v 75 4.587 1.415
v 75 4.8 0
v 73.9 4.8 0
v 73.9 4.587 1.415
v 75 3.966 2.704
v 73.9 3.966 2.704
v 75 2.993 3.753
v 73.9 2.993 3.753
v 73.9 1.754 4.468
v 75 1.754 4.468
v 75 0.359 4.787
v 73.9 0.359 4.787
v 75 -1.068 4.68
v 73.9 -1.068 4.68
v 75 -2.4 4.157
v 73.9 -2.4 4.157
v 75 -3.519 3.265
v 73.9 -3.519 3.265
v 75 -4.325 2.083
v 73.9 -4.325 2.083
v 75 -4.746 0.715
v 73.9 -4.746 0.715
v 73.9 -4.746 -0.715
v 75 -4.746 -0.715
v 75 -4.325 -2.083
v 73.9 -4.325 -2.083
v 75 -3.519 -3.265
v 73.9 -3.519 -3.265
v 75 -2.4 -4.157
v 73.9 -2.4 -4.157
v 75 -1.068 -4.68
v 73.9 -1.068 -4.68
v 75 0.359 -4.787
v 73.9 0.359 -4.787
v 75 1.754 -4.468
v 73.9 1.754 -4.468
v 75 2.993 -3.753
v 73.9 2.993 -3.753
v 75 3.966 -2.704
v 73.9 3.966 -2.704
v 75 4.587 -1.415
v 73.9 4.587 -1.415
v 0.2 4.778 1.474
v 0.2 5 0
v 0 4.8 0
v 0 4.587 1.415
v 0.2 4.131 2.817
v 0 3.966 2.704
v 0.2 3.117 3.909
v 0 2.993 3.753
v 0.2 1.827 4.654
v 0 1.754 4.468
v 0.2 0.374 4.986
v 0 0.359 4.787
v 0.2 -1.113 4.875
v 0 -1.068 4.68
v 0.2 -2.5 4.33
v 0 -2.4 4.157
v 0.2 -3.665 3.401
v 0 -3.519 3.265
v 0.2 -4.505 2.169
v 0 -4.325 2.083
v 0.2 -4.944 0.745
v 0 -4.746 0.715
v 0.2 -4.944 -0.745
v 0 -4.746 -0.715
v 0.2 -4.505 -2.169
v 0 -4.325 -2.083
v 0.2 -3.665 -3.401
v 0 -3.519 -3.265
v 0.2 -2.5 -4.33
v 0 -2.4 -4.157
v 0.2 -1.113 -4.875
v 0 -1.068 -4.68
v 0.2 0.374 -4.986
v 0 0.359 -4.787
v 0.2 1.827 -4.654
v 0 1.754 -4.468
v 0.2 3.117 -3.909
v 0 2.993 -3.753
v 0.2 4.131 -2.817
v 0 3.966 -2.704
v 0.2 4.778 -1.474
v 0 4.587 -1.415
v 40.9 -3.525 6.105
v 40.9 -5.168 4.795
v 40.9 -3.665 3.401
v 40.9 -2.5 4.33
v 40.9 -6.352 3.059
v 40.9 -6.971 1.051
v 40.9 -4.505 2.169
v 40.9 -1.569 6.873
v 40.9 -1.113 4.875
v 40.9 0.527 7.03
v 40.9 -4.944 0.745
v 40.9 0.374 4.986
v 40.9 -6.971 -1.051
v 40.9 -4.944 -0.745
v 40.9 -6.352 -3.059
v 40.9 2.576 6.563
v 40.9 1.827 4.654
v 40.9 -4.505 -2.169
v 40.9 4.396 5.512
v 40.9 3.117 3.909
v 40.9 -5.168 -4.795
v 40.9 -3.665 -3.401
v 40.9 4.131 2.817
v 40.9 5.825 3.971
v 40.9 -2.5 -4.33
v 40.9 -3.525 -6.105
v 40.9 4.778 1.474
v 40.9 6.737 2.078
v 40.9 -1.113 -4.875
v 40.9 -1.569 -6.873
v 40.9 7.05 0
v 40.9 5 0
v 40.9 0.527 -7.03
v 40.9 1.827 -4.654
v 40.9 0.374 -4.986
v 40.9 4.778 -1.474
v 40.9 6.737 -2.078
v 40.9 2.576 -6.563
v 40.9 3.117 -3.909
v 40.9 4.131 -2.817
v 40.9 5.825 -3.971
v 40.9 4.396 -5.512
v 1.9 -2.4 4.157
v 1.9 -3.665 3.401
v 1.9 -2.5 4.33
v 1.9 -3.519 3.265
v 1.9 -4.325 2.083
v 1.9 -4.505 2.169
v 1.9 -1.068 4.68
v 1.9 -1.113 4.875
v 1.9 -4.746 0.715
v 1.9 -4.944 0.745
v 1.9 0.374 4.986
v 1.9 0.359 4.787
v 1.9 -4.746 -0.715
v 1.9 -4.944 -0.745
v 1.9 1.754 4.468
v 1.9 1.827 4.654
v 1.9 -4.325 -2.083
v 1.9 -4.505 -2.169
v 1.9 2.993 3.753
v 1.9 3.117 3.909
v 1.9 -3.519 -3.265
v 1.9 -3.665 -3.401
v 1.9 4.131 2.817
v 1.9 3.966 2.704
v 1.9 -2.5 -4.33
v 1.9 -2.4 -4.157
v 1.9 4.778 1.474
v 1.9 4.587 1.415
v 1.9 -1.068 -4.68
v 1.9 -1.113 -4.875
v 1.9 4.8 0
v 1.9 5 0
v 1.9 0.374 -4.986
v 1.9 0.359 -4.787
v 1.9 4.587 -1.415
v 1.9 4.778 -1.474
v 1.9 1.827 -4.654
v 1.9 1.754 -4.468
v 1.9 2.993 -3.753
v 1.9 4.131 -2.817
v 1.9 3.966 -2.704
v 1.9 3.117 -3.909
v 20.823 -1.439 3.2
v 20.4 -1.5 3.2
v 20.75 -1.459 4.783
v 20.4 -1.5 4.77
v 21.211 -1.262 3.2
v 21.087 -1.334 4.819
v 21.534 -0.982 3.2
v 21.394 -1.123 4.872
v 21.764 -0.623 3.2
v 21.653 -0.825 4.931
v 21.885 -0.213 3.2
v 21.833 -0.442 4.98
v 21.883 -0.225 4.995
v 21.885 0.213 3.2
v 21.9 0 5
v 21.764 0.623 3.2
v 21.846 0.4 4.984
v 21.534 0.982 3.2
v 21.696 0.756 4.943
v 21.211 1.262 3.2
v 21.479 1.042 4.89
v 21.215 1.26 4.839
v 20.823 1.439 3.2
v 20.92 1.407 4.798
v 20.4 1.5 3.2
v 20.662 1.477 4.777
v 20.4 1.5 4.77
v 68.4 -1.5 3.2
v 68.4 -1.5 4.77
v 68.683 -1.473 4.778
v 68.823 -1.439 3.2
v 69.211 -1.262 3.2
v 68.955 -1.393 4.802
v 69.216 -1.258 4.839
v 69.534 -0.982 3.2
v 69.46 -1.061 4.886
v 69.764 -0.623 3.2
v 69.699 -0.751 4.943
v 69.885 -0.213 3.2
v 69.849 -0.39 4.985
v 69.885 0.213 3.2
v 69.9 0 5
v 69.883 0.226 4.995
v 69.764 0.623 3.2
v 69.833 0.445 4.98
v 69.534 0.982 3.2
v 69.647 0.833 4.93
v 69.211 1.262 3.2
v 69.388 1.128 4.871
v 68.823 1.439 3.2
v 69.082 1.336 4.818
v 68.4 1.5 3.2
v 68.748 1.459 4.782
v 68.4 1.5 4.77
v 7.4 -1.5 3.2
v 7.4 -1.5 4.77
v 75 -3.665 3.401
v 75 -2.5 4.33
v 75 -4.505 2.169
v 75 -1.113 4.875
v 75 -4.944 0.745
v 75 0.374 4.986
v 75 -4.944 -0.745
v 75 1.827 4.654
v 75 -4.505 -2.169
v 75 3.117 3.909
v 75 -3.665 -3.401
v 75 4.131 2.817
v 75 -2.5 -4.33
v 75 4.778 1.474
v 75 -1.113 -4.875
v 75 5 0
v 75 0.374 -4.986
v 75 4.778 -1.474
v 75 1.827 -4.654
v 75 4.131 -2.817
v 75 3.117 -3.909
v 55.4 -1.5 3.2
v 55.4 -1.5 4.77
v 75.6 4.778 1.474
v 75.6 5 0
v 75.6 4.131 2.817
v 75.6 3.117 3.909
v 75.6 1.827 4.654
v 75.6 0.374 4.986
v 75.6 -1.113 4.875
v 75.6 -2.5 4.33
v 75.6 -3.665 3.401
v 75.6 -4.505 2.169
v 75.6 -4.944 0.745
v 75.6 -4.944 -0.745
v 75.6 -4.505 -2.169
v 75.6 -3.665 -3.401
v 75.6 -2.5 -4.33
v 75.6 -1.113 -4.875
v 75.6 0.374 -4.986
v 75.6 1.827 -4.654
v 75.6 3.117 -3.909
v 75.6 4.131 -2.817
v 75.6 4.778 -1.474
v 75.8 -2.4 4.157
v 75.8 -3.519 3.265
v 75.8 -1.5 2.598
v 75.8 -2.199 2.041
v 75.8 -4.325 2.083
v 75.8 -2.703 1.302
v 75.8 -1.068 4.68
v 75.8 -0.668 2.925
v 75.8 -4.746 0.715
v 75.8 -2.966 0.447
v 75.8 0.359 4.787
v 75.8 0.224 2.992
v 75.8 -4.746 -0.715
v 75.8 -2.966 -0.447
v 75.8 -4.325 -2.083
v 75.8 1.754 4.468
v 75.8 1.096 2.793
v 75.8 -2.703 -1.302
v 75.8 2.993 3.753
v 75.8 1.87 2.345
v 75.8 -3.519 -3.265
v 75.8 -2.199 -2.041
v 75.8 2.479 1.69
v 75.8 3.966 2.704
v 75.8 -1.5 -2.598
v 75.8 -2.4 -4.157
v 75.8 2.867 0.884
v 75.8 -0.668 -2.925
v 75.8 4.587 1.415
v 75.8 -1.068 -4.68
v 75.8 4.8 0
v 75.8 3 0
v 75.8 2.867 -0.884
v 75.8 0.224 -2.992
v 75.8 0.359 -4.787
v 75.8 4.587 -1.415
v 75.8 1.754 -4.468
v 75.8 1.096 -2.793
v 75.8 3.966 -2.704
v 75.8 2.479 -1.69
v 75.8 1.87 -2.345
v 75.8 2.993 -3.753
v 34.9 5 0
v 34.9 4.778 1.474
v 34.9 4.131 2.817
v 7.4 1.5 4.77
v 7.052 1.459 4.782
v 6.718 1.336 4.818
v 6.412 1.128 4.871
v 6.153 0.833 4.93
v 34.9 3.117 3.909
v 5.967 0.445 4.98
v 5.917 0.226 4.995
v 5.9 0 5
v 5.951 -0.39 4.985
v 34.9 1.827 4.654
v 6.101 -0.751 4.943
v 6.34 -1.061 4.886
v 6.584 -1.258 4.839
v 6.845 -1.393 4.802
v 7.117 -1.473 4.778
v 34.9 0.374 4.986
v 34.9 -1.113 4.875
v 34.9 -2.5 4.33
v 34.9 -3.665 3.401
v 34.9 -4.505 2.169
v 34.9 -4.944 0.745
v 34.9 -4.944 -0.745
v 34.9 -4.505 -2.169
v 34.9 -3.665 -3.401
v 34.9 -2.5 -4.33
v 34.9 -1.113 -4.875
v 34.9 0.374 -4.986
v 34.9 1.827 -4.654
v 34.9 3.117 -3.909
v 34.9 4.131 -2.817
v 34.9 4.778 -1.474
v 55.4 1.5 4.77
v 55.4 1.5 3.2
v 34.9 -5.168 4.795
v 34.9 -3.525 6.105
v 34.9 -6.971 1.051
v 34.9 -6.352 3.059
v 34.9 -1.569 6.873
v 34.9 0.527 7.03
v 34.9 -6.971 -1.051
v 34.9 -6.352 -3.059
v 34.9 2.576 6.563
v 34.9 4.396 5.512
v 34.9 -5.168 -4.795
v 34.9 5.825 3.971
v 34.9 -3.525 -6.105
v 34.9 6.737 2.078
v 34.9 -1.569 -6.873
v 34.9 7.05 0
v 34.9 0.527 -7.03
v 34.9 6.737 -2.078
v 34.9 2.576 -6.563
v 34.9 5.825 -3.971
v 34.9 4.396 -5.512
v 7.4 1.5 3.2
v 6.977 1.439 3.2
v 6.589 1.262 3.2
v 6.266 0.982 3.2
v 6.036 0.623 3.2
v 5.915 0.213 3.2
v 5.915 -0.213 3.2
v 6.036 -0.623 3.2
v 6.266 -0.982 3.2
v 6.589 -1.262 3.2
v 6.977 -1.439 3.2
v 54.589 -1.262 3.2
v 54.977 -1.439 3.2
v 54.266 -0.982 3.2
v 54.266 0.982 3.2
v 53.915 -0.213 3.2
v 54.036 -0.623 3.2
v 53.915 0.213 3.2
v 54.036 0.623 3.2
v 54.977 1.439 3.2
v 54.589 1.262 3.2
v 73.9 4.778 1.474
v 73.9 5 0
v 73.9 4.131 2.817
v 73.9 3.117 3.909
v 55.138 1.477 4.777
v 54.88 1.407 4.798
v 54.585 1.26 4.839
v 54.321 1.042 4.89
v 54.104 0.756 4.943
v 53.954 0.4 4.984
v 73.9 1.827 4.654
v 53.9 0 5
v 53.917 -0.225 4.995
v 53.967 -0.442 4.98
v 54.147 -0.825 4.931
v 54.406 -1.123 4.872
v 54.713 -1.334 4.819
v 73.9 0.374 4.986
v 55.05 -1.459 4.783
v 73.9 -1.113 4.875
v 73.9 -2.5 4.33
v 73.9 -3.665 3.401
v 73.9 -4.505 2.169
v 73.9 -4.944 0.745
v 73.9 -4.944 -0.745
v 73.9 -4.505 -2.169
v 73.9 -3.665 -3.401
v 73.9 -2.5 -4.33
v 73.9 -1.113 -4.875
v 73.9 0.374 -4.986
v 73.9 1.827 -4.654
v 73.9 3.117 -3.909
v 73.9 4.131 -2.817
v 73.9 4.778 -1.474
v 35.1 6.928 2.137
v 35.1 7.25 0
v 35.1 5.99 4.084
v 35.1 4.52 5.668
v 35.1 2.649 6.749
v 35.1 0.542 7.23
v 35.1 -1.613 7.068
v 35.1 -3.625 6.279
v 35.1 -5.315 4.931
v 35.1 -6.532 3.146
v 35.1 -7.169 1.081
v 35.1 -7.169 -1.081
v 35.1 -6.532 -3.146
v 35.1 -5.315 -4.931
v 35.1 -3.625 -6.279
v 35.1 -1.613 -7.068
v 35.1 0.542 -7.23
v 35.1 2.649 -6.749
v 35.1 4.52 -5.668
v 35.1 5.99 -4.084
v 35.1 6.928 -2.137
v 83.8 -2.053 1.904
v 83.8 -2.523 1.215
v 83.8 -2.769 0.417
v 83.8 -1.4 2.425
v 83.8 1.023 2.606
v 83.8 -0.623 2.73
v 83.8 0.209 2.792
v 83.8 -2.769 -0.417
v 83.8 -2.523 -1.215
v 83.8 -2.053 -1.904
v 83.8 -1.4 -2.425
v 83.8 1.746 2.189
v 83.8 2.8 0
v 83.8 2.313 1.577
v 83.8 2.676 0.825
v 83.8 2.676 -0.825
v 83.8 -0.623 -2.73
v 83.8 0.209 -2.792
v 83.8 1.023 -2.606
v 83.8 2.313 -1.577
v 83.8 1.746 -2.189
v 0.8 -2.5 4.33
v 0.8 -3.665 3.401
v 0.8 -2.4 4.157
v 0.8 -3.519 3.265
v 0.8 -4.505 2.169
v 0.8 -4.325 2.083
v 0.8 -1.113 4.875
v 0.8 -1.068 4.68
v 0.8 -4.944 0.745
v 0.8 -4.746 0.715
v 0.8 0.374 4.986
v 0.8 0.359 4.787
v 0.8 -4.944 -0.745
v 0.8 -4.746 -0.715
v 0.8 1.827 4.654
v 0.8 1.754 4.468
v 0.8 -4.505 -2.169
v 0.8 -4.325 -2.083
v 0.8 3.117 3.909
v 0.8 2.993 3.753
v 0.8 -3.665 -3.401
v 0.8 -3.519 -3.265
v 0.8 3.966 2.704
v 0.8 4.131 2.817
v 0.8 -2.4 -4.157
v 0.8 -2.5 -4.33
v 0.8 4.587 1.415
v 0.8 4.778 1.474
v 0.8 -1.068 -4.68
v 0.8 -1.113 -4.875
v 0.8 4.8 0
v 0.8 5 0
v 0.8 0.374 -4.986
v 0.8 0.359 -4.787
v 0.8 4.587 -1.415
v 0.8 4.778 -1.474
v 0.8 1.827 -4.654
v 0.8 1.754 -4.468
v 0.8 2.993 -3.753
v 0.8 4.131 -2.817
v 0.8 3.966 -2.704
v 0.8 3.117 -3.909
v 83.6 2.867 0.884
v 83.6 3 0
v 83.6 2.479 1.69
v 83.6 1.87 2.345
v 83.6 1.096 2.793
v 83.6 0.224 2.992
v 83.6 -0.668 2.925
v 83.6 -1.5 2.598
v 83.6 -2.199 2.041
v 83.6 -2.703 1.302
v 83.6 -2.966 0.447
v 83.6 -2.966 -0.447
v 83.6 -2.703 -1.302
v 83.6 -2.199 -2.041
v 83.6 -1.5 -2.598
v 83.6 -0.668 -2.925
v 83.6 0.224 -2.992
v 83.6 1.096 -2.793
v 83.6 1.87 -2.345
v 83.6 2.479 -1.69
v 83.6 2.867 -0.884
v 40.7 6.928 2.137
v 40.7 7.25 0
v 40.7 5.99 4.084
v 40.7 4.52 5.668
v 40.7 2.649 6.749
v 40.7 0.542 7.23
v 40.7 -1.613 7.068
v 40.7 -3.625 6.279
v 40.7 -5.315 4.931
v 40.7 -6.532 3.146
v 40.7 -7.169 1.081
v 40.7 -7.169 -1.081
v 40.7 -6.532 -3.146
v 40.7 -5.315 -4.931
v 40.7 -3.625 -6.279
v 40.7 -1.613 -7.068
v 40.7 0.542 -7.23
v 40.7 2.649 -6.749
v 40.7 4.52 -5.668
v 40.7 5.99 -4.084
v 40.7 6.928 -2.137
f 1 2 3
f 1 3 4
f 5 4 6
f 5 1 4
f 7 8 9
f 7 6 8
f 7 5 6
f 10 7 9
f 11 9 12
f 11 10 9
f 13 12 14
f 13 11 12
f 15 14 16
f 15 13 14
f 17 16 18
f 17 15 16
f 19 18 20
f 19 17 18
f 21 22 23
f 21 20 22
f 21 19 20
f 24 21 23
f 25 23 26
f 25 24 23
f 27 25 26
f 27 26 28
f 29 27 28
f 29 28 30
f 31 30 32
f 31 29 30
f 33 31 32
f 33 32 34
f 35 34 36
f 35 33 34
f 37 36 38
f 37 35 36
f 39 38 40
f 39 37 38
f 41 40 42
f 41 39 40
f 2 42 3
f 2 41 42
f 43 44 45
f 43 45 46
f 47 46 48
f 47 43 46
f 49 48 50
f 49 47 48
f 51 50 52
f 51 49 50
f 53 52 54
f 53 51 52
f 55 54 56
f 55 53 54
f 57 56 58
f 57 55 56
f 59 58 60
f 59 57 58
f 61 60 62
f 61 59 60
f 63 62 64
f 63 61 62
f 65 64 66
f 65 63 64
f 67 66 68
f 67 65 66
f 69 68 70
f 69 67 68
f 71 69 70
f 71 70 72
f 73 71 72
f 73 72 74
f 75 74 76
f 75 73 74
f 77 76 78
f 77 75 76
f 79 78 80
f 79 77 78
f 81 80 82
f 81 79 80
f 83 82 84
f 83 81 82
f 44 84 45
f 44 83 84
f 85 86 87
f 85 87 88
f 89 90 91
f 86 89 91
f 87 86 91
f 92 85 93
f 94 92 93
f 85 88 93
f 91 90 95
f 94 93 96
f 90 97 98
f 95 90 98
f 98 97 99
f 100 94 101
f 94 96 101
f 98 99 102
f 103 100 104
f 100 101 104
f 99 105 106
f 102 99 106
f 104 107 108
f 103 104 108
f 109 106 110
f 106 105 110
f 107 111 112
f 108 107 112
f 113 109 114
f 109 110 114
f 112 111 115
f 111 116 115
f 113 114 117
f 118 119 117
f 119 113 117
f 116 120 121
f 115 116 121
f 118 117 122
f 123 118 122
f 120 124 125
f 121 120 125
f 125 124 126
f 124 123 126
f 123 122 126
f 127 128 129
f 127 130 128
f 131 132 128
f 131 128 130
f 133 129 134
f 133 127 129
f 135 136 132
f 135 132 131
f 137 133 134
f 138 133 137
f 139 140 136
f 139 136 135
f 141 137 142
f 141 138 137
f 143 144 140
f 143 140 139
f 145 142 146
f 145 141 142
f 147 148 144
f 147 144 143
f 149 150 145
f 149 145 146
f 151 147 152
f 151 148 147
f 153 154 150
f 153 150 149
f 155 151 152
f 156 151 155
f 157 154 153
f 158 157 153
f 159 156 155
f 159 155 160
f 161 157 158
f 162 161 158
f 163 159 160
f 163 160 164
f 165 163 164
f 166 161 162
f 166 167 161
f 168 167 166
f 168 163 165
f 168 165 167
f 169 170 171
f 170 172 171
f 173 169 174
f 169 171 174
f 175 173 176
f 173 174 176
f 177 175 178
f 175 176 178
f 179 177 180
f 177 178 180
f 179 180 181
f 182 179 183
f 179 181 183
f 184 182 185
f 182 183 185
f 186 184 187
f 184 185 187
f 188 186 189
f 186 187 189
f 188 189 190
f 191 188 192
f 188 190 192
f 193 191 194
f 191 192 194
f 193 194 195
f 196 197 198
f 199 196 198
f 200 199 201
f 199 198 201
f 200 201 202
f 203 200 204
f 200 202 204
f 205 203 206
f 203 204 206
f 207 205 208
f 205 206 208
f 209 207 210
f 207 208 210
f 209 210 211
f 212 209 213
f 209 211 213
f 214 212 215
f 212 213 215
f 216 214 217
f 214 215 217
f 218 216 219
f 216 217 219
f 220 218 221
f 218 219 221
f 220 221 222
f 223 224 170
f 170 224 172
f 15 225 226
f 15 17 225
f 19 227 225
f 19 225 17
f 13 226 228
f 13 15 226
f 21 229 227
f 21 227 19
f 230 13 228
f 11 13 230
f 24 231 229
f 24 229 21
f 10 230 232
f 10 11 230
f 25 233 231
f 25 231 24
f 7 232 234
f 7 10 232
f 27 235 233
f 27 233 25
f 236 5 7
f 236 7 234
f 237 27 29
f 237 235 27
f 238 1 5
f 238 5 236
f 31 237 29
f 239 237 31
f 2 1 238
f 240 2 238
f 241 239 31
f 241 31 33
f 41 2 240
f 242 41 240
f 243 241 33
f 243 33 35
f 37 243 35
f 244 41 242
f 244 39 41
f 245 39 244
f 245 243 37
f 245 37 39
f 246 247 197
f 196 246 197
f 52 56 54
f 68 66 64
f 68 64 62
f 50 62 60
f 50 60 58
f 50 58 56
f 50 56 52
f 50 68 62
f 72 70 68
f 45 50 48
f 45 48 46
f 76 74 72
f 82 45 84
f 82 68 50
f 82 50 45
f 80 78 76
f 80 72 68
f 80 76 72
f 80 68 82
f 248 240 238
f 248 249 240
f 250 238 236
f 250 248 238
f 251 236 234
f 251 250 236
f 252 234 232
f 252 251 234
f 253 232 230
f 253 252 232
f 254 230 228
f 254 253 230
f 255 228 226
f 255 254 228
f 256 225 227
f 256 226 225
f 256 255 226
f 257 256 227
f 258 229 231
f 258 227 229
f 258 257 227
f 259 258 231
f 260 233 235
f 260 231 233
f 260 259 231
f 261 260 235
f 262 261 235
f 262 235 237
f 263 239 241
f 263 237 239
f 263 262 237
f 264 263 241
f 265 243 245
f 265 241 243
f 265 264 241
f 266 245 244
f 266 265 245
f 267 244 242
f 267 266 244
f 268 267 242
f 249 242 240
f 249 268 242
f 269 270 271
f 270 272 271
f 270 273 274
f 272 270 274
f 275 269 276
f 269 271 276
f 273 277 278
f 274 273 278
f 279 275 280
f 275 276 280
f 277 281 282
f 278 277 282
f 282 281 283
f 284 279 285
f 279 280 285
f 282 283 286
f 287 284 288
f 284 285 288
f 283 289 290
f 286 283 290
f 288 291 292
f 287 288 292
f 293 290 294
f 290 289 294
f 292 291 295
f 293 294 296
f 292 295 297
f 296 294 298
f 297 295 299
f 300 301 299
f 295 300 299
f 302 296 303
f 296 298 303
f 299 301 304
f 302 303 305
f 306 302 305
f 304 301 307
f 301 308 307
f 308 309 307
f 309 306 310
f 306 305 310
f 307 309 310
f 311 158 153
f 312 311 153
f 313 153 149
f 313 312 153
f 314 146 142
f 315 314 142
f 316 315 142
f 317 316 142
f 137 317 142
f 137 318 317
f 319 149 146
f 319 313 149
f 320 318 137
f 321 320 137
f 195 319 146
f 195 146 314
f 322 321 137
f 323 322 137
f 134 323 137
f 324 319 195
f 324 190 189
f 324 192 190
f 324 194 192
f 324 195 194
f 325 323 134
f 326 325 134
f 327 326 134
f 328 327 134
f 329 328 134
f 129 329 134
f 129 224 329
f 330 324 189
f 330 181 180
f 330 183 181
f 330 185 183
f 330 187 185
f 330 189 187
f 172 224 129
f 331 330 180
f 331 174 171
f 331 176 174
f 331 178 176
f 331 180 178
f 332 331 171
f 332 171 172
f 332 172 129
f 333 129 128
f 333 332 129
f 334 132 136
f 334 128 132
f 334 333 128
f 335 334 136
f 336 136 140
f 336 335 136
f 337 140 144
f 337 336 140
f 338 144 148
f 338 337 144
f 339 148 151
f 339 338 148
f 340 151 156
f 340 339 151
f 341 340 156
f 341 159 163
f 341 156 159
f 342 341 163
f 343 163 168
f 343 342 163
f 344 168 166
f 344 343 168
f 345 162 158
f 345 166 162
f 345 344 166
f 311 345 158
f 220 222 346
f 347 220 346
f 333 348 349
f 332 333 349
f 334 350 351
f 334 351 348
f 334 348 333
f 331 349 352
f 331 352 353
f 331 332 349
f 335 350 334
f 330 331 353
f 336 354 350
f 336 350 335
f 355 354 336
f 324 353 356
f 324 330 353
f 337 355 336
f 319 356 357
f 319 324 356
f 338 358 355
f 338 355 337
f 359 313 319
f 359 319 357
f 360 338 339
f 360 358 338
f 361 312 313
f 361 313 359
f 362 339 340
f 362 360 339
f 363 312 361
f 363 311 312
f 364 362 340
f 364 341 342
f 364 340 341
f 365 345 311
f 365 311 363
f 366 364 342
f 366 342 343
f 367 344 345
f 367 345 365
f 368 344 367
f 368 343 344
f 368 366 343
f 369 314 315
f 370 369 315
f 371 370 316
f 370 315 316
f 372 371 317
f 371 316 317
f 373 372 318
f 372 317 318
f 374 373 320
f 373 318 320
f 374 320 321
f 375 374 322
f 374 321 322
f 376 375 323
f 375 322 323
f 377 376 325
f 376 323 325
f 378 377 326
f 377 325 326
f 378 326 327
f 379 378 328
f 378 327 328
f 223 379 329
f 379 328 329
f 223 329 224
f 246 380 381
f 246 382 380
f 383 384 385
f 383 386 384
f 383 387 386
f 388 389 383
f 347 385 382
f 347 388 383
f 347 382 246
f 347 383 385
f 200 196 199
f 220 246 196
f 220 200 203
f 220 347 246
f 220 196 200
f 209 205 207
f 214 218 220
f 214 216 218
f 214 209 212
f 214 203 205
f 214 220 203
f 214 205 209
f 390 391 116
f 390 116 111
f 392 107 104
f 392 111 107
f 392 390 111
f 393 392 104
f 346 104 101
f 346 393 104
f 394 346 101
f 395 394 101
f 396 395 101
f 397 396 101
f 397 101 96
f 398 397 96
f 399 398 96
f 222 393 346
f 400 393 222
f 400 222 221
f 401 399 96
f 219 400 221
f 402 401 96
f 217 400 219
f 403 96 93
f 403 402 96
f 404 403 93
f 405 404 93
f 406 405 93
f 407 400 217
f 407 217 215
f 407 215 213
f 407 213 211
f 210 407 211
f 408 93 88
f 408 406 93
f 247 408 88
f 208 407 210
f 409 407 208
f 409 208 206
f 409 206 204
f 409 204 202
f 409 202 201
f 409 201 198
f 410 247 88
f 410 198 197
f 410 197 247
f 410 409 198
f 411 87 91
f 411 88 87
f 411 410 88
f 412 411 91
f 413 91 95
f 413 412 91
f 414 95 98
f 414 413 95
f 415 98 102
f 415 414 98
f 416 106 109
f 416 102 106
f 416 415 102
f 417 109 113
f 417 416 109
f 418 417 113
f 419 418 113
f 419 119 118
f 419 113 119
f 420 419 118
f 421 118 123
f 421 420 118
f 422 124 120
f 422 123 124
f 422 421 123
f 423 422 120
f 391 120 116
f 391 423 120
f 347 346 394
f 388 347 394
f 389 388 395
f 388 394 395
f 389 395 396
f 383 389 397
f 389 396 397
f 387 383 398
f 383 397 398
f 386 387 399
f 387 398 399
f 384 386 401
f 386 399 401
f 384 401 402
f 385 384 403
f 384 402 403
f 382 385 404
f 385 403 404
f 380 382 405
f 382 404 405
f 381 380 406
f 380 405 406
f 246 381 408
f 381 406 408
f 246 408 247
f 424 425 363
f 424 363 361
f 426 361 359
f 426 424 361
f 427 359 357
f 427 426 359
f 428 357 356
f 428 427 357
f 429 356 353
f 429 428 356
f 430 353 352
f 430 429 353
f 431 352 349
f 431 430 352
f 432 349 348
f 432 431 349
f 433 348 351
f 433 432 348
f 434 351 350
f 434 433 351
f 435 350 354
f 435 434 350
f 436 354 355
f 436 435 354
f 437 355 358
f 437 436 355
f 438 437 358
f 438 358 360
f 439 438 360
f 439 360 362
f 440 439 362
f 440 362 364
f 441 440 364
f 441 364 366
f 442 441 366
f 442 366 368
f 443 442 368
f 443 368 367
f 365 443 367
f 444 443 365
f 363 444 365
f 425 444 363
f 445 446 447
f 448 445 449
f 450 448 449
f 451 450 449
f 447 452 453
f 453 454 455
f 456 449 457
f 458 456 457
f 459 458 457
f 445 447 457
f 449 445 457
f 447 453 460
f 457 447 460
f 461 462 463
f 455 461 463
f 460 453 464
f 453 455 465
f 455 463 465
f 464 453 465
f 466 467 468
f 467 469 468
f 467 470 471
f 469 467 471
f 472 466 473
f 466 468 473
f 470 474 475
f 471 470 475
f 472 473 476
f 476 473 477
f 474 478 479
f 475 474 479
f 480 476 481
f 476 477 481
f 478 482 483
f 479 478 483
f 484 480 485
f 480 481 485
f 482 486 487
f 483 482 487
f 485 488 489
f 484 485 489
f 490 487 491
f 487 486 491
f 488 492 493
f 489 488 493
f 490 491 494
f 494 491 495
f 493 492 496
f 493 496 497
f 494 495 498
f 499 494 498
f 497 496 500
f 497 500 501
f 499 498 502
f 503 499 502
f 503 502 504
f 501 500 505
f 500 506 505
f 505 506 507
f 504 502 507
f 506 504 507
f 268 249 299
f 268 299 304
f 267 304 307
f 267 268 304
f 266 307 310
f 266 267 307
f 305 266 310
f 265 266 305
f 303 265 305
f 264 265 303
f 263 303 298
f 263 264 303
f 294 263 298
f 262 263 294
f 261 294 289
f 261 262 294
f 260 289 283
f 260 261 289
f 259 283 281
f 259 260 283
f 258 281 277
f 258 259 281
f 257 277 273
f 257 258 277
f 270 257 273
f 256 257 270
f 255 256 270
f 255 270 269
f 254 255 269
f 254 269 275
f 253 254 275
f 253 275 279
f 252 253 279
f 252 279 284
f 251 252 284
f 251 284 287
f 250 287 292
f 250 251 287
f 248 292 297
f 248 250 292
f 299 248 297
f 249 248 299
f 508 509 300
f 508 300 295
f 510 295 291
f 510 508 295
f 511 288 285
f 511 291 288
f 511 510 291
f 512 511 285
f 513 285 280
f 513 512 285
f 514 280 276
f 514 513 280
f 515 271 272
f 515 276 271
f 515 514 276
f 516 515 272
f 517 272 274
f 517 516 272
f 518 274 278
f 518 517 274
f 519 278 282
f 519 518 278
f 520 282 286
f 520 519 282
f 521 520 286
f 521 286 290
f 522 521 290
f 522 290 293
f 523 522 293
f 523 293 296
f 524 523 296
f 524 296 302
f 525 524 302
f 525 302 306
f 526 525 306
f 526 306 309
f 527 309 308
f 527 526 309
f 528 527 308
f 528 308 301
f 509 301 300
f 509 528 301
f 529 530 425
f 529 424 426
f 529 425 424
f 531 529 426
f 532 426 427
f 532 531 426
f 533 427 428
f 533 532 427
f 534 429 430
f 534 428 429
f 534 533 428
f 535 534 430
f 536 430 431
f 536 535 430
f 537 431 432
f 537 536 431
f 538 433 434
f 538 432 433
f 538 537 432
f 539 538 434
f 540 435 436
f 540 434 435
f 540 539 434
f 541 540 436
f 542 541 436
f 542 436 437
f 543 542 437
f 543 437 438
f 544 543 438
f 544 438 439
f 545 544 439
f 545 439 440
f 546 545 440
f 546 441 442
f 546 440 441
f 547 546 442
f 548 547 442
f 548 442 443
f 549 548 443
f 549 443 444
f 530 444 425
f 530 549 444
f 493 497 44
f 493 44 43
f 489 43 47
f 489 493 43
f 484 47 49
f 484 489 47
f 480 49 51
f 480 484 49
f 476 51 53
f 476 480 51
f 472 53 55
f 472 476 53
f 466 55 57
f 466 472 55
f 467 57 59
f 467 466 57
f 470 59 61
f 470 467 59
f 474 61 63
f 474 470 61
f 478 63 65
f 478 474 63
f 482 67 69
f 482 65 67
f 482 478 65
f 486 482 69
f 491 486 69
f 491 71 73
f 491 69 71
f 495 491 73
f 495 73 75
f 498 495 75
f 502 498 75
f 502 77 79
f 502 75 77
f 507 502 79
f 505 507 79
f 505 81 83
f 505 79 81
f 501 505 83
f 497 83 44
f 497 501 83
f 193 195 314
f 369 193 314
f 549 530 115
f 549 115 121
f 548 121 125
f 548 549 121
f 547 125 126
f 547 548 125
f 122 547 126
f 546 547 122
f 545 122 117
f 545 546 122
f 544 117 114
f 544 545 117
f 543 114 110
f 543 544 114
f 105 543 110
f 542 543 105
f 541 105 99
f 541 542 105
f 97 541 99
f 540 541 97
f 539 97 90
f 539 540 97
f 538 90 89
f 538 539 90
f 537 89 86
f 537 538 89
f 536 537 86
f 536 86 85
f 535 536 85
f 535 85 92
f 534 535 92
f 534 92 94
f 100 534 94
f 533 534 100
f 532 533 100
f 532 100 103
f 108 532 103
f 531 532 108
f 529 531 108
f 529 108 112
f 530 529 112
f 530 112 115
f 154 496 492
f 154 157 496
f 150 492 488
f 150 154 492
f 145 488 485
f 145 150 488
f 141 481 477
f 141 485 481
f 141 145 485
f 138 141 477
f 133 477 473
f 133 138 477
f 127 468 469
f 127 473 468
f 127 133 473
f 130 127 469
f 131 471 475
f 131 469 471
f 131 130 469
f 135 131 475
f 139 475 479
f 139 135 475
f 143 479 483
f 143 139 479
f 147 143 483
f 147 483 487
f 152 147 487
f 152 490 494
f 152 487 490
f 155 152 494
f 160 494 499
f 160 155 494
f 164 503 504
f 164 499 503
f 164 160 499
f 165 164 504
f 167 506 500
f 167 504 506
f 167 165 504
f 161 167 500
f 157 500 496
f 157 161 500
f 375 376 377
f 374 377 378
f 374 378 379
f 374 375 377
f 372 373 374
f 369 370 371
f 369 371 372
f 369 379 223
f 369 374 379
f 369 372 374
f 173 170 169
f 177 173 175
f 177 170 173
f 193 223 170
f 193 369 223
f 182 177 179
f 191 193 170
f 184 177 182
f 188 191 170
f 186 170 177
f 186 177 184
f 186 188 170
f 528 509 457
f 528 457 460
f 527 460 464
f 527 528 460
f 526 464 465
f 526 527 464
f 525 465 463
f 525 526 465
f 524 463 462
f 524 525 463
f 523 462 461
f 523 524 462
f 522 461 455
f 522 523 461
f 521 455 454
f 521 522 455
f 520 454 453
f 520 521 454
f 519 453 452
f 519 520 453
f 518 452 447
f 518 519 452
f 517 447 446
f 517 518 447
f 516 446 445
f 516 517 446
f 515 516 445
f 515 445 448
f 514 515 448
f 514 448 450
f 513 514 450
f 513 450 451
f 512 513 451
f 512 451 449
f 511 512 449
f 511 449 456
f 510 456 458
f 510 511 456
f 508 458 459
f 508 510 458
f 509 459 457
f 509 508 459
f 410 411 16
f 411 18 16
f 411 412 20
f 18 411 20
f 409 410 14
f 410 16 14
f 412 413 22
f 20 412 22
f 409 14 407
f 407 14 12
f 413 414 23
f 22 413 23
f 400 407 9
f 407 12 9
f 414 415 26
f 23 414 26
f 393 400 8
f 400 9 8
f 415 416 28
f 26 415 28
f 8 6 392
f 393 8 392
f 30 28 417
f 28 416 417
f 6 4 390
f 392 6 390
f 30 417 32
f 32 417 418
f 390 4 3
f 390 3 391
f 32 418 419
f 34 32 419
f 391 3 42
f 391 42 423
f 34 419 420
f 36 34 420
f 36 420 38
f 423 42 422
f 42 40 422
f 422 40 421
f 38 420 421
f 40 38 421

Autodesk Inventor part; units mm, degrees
ref_plane "YZ Plane" through (0, 0, 0) normal (1, 0, 0) x (0, 1, 0)
ref_plane "XZ Plane" through (0, 0, 0) normal (0, 1, 0) x (-1, 0, 0)
sketch "Skizze1" plane through (0, 0, 0) normal (0, 0, 1) x (1, 0, 0)
  line L0 (0, 0) -> (0, 5)
  line L1 (0, 5) -> (0.8, 5)
  line L2 (0.8, 5) -> (0.8, 4.8)
  line L3 (0.8, 4.8) -> (1.9, 4.8)
  line L4 (1.9, 4.8) -> (1.9, 5)
  line L5 (1.9, 5) -> (34.9, 5)
  line L6 (34.9, 5) -> (34.9, 7.25)
  line L7 (34.9, 7.25) -> (40.9, 7.25)
  line L8 (40.9, 7.25) -> (40.9, 5)
  line L9 (40.9, 5) -> (73.9, 5)
  line L10 (73.9, 5) -> (73.9, 4.8)
  line L11 (73.9, 4.8) -> (75, 4.8)
  line L12 (75, 4.8) -> (75, 5)
  line L13 (75, 5) -> (75.8, 5)
  line L14 (75.8, 5) -> (75.8, 3)
  line L15 (75.8, 3) -> (83.8, 3)
  line L16 (83.8, 3) -> (83.8, 0)
  line L17 (83.8, 0) -> (0, 0)
  line L18 (25.9, 5) -> (25.9, 0) construction
  line L19 (49.9, 5) -> (49.9, 0) construction
  line L20 (15.9, 5) -> (15.9, 0) construction
  line L21 (59.9, 5) -> (59.9, 0) construction
  dimension "d0" = 10
  dimension "d1" = 6
  dimension "d2" = 14.5
  dimension "d3" = 1.1
  dimension "d4" = 9.6
  dimension "d5" = 0.8
  dimension "d6" = 0.8
  dimension "d7" = 9
  dimension "d8" = 9
  dimension "d9" = 6
  dimension "d10" = 24
  dimension "d11" = 24
  dimension "d12" = 8
  dimension "ParrallelMecha_DrivenLink_OuterWidth" = 72
  dimension "d22" = 10
  dimension "d23" = 10
  dimension "Querstrebe_Length" = 44
revolve "Umdrehung1" add sketch "Skizze1" angle 360 about axis through (83.8, 0, 0) along (-1, 0, 0)
chamfer "Fase1" distance 0.2 angle 45 5 edges at (34.9, -7.25, 0) (40.9, -7.25, 0) (75.8, -5, 0) (83.8, -3, 0) (0, -5, 0)
ref_plane "Wellennut_Spiegelebene" through (37.9, 0, 0) normal (-1, 0, 0) x (0, 0, 1)
ref_plane "Arbeitsebene2" through (18.4, 0, 5) normal (0, 0, 1) x (1, 0, 0)
sketch "Skizze3" plane through (18.4, 0, 5) normal (0, 0, 1) x (1, 0, 0)
  line L0 (7.5, 5) -> (7.5, 0) construction
  line L1 (-35.16, 0) -> (82.16, 0) construction
  line L2 (2, 0) -> (-11, 0) construction
  line L3 (2, 1.5) -> (-11, 1.5)
  line L4 (-11, -1.5) -> (2, -1.5)
  arc A0 (2, -1.5) -> (2, 1.5) centre (2, 0) ccw
  arc A1 (-11, 1.5) -> (-11, -1.5) centre (-11, 0) ccw
  line L5 (-16.5, 0) -> (7.5, 0) construction
  line L6 (-16.5, -5) -> (-16.5, 5) construction
  point P0 (-18.4, 0)
  point P1 (-4.5, 0)
  point P2 (-4.5, 0)
  dimension "d17" = 3
  dimension "d18" = 16
extrude "Wellennut" cut sketch "Skizze3" against normal blind 1.8
mirror "Spiegeln1" about plane through (37.9, 0, 0) normal (-1, 0, 0) of "Wellennut"
equation "\"d10\" = ParallelLink_Lever_Thickness_1 + ParallelLink_BearingStep_Height_1"
equation "\"d11\" = d10"
equation "\"d22\" = ParallelLink_BearingStep_Height_1"
equation "\"d23\" = d22"
equation "\"ParallelLink_Lever_Thickness_1\" = 14"
equation "\"ParallelLink_BearingStep_Height_1\" = 10"
properties part number "ParallelSystem_ProximalPart_Shaft_Driven" material "Edelstahl"
